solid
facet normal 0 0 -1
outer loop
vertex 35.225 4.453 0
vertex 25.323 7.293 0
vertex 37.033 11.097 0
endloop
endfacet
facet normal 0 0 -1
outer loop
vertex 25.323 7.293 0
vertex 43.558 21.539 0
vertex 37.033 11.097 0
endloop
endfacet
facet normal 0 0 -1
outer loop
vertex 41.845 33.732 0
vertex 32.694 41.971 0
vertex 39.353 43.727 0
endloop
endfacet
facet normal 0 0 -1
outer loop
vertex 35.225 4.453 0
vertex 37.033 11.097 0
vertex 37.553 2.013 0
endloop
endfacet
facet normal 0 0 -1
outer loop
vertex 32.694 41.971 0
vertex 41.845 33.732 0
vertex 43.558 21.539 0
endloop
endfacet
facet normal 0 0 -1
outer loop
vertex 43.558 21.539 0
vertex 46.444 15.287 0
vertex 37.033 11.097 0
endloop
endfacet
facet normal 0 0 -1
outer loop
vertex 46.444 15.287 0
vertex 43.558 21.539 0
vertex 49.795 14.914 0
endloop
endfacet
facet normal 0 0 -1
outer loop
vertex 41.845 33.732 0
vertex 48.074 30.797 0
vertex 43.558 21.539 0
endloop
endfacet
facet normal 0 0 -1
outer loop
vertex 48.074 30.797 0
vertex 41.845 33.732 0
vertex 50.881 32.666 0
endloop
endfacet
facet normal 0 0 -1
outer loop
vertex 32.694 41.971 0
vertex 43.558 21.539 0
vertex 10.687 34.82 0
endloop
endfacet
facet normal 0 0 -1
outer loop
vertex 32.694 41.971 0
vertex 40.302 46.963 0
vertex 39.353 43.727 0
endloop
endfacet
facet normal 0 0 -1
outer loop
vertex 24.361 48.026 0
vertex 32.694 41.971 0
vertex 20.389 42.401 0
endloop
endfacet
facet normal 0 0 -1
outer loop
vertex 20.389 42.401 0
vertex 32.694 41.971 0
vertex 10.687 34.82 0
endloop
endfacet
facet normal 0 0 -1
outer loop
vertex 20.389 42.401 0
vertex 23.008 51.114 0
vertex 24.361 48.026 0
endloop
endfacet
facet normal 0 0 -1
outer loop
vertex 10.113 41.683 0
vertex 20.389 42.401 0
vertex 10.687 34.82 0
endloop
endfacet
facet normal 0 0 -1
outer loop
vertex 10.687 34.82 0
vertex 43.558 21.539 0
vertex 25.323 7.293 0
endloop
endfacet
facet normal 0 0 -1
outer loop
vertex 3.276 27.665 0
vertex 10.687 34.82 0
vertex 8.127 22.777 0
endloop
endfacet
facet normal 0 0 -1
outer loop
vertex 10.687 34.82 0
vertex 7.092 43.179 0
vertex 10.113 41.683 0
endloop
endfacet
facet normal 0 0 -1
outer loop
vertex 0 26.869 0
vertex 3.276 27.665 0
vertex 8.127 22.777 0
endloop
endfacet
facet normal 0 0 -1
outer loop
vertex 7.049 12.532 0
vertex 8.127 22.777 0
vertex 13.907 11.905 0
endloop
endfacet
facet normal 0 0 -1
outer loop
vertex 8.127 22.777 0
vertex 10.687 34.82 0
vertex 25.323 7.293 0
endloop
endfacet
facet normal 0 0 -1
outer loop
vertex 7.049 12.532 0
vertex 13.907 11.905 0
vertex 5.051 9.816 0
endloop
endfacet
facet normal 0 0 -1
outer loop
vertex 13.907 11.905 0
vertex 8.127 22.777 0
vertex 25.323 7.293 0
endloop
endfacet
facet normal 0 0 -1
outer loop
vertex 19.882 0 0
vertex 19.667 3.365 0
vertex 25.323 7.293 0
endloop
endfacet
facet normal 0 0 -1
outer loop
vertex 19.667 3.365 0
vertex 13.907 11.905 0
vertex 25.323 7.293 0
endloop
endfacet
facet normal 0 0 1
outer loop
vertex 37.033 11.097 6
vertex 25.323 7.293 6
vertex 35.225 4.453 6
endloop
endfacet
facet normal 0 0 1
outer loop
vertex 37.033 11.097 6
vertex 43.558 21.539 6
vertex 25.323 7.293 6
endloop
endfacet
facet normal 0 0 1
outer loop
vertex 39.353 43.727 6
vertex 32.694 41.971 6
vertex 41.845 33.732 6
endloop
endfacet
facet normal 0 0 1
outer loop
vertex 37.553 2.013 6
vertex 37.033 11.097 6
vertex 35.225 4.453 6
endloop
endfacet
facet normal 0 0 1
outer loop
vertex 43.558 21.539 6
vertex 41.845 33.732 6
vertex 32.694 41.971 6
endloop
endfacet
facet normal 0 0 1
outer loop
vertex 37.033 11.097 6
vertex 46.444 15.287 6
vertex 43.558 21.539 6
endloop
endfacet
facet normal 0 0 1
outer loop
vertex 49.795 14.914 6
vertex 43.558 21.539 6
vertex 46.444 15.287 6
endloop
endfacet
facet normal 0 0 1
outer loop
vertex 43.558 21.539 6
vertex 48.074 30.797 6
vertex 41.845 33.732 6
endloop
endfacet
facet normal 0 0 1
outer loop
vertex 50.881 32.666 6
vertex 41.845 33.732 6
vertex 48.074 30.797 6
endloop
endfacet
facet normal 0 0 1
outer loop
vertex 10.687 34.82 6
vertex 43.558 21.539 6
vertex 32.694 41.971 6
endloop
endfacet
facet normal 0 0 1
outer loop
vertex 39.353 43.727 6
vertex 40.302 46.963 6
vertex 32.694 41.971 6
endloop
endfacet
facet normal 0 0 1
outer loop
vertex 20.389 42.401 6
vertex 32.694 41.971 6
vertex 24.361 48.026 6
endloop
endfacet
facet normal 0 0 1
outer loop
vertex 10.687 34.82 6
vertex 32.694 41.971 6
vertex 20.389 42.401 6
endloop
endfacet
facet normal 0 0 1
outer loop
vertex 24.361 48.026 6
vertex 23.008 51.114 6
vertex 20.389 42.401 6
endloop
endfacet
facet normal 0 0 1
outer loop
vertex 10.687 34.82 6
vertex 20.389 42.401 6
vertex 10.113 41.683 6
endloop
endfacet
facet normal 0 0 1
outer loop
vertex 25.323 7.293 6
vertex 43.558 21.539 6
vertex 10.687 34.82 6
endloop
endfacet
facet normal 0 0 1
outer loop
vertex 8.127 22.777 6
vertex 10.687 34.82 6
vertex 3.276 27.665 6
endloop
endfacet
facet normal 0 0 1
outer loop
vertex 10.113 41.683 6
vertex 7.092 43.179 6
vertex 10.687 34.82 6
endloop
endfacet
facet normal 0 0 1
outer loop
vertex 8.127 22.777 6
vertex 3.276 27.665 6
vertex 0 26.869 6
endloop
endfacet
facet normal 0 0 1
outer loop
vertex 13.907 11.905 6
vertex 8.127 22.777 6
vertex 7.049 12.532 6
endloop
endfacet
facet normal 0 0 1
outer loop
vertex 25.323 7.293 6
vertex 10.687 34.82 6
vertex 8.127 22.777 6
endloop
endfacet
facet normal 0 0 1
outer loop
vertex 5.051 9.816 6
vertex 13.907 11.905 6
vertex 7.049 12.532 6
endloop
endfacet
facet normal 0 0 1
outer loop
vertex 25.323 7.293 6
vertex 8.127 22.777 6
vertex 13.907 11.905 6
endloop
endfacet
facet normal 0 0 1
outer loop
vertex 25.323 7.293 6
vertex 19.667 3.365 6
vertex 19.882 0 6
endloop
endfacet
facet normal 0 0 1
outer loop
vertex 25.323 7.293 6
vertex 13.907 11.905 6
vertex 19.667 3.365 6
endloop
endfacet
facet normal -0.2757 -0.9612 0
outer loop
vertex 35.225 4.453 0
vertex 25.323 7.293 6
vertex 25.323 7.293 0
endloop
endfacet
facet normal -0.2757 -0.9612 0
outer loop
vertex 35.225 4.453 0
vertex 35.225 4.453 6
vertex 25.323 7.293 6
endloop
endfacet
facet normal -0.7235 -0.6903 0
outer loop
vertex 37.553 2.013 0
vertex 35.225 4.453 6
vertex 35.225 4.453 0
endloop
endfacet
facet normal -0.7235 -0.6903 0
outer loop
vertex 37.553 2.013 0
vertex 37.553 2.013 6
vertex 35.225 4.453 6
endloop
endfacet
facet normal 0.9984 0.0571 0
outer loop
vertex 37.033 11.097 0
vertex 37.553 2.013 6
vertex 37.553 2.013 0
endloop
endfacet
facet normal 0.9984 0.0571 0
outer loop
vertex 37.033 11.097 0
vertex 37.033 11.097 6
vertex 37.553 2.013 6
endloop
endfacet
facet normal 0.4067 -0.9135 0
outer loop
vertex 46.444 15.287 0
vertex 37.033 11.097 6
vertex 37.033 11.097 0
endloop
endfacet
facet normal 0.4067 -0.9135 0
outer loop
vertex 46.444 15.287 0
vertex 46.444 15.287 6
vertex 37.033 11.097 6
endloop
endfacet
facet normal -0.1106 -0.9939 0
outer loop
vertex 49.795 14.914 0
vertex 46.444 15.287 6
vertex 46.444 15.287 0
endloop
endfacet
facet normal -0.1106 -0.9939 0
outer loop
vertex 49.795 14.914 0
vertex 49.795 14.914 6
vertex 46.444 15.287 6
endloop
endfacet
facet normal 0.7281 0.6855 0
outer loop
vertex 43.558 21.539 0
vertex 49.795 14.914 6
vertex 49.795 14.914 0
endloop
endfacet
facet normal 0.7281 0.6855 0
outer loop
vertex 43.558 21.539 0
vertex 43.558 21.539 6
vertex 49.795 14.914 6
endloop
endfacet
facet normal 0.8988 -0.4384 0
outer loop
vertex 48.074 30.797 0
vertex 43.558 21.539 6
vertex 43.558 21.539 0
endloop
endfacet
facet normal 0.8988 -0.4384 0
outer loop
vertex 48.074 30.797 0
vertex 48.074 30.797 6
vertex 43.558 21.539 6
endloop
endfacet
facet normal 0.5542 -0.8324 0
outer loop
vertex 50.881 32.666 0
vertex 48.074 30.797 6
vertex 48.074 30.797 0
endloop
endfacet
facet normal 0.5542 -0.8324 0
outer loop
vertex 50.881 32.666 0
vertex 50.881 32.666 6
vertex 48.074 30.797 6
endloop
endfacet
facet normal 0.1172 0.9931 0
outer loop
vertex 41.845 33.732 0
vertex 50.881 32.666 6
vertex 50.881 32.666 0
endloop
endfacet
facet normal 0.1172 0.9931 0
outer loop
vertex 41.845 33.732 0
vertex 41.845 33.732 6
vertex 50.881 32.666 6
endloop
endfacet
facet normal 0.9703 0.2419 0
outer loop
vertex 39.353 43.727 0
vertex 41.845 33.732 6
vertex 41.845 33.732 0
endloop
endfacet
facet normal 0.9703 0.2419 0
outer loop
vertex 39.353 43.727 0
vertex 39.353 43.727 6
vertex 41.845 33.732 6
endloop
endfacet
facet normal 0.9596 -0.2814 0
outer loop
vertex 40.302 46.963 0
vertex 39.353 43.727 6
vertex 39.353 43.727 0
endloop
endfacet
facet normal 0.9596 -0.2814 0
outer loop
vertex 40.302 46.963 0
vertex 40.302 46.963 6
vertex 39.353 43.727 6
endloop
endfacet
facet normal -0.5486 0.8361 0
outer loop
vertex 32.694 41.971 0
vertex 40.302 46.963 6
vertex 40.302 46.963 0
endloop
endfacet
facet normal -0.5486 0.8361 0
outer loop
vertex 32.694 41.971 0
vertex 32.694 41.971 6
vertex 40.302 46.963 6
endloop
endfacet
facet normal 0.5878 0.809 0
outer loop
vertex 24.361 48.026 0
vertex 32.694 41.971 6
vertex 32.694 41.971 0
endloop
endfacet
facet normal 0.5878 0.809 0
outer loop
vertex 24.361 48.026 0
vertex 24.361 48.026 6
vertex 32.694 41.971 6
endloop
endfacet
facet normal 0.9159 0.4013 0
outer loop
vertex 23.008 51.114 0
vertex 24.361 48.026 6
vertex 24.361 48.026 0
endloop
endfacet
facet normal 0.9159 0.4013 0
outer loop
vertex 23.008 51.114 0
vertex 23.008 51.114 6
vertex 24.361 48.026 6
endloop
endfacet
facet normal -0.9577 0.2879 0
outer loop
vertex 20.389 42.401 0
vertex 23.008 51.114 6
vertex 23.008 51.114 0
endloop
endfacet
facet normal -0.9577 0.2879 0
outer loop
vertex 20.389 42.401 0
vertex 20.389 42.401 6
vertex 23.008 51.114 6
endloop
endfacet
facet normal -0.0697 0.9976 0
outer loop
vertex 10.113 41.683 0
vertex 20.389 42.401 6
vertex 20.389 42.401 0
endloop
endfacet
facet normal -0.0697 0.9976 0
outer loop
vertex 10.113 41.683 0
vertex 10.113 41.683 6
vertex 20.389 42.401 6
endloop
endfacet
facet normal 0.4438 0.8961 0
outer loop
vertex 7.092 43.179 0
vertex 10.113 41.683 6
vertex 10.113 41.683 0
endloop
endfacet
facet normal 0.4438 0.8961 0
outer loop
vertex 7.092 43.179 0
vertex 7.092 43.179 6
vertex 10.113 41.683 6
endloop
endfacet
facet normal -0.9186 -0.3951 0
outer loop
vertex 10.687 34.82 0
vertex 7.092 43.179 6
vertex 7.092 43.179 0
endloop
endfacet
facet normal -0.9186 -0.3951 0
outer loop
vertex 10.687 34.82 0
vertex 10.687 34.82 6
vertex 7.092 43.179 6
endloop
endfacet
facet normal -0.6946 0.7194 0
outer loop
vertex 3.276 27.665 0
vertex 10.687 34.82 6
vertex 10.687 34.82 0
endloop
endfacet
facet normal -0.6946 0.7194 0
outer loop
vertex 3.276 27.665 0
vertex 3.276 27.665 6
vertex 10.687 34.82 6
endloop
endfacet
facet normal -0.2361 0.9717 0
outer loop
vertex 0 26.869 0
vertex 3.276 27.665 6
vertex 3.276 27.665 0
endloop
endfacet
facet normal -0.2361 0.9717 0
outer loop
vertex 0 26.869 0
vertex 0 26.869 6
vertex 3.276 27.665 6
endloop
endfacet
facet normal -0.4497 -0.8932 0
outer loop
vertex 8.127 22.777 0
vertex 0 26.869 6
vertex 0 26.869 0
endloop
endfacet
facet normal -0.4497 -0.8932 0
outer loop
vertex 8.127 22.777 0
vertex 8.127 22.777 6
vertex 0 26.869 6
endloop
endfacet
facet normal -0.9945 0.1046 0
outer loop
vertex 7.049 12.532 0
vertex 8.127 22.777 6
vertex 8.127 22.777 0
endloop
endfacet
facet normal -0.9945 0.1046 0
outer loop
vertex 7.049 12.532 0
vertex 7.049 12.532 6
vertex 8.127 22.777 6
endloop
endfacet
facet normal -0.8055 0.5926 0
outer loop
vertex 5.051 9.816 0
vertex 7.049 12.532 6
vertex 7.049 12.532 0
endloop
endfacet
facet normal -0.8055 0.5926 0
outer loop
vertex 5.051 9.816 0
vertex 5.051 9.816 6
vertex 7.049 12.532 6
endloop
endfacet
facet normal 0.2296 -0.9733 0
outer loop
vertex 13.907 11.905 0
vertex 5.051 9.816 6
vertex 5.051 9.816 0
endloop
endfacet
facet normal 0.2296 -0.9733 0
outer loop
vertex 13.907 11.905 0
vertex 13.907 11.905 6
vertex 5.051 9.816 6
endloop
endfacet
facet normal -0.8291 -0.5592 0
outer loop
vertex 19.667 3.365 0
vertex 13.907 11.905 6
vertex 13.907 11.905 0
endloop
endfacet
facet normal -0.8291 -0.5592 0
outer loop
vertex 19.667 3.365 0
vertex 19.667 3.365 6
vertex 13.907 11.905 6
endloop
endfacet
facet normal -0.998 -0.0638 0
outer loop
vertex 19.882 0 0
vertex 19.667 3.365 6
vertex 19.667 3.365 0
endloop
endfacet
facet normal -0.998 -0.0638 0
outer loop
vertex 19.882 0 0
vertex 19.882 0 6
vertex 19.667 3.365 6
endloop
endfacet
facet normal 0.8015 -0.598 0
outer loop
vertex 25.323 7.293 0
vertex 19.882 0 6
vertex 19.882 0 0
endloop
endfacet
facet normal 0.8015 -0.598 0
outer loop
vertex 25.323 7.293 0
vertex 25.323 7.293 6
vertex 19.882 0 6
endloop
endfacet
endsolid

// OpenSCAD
$fn = 32;

// ----------------------------------------------------------------------
// Fan rotor section: 9 blades, 18 mm hub radius, 8 mm blades
// ----------------------------------------------------------------------

// --- parameters (mm) ---
profile_height = 6;       // extrusion height
profile_points = 27;      // points of the closed outline

profile = [[43.558, 21.539], [48.074, 30.797], [50.881, 32.666], [41.845, 33.732], [39.353, 43.727], [40.302, 46.963], [32.694, 41.971], [24.361, 48.026], [23.008, 51.114], [20.389, 42.401], [10.113, 41.683], [7.092, 43.179], [10.687, 34.82], [3.276, 27.665], [0, 26.869], [8.127, 22.777], [7.049, 12.532], [5.051, 9.816], [13.907, 11.905], [19.667, 3.365], [19.882, 0], [25.323, 7.293], [35.225, 4.453], [37.553, 2.013], [37.033, 11.097], [46.444, 15.287], [49.795, 14.914]];  // single closed polygon, 27 points, counter clockwise

// --- the one profile operation ---
linear_extrude(height = profile_height) polygon(points = profile);
